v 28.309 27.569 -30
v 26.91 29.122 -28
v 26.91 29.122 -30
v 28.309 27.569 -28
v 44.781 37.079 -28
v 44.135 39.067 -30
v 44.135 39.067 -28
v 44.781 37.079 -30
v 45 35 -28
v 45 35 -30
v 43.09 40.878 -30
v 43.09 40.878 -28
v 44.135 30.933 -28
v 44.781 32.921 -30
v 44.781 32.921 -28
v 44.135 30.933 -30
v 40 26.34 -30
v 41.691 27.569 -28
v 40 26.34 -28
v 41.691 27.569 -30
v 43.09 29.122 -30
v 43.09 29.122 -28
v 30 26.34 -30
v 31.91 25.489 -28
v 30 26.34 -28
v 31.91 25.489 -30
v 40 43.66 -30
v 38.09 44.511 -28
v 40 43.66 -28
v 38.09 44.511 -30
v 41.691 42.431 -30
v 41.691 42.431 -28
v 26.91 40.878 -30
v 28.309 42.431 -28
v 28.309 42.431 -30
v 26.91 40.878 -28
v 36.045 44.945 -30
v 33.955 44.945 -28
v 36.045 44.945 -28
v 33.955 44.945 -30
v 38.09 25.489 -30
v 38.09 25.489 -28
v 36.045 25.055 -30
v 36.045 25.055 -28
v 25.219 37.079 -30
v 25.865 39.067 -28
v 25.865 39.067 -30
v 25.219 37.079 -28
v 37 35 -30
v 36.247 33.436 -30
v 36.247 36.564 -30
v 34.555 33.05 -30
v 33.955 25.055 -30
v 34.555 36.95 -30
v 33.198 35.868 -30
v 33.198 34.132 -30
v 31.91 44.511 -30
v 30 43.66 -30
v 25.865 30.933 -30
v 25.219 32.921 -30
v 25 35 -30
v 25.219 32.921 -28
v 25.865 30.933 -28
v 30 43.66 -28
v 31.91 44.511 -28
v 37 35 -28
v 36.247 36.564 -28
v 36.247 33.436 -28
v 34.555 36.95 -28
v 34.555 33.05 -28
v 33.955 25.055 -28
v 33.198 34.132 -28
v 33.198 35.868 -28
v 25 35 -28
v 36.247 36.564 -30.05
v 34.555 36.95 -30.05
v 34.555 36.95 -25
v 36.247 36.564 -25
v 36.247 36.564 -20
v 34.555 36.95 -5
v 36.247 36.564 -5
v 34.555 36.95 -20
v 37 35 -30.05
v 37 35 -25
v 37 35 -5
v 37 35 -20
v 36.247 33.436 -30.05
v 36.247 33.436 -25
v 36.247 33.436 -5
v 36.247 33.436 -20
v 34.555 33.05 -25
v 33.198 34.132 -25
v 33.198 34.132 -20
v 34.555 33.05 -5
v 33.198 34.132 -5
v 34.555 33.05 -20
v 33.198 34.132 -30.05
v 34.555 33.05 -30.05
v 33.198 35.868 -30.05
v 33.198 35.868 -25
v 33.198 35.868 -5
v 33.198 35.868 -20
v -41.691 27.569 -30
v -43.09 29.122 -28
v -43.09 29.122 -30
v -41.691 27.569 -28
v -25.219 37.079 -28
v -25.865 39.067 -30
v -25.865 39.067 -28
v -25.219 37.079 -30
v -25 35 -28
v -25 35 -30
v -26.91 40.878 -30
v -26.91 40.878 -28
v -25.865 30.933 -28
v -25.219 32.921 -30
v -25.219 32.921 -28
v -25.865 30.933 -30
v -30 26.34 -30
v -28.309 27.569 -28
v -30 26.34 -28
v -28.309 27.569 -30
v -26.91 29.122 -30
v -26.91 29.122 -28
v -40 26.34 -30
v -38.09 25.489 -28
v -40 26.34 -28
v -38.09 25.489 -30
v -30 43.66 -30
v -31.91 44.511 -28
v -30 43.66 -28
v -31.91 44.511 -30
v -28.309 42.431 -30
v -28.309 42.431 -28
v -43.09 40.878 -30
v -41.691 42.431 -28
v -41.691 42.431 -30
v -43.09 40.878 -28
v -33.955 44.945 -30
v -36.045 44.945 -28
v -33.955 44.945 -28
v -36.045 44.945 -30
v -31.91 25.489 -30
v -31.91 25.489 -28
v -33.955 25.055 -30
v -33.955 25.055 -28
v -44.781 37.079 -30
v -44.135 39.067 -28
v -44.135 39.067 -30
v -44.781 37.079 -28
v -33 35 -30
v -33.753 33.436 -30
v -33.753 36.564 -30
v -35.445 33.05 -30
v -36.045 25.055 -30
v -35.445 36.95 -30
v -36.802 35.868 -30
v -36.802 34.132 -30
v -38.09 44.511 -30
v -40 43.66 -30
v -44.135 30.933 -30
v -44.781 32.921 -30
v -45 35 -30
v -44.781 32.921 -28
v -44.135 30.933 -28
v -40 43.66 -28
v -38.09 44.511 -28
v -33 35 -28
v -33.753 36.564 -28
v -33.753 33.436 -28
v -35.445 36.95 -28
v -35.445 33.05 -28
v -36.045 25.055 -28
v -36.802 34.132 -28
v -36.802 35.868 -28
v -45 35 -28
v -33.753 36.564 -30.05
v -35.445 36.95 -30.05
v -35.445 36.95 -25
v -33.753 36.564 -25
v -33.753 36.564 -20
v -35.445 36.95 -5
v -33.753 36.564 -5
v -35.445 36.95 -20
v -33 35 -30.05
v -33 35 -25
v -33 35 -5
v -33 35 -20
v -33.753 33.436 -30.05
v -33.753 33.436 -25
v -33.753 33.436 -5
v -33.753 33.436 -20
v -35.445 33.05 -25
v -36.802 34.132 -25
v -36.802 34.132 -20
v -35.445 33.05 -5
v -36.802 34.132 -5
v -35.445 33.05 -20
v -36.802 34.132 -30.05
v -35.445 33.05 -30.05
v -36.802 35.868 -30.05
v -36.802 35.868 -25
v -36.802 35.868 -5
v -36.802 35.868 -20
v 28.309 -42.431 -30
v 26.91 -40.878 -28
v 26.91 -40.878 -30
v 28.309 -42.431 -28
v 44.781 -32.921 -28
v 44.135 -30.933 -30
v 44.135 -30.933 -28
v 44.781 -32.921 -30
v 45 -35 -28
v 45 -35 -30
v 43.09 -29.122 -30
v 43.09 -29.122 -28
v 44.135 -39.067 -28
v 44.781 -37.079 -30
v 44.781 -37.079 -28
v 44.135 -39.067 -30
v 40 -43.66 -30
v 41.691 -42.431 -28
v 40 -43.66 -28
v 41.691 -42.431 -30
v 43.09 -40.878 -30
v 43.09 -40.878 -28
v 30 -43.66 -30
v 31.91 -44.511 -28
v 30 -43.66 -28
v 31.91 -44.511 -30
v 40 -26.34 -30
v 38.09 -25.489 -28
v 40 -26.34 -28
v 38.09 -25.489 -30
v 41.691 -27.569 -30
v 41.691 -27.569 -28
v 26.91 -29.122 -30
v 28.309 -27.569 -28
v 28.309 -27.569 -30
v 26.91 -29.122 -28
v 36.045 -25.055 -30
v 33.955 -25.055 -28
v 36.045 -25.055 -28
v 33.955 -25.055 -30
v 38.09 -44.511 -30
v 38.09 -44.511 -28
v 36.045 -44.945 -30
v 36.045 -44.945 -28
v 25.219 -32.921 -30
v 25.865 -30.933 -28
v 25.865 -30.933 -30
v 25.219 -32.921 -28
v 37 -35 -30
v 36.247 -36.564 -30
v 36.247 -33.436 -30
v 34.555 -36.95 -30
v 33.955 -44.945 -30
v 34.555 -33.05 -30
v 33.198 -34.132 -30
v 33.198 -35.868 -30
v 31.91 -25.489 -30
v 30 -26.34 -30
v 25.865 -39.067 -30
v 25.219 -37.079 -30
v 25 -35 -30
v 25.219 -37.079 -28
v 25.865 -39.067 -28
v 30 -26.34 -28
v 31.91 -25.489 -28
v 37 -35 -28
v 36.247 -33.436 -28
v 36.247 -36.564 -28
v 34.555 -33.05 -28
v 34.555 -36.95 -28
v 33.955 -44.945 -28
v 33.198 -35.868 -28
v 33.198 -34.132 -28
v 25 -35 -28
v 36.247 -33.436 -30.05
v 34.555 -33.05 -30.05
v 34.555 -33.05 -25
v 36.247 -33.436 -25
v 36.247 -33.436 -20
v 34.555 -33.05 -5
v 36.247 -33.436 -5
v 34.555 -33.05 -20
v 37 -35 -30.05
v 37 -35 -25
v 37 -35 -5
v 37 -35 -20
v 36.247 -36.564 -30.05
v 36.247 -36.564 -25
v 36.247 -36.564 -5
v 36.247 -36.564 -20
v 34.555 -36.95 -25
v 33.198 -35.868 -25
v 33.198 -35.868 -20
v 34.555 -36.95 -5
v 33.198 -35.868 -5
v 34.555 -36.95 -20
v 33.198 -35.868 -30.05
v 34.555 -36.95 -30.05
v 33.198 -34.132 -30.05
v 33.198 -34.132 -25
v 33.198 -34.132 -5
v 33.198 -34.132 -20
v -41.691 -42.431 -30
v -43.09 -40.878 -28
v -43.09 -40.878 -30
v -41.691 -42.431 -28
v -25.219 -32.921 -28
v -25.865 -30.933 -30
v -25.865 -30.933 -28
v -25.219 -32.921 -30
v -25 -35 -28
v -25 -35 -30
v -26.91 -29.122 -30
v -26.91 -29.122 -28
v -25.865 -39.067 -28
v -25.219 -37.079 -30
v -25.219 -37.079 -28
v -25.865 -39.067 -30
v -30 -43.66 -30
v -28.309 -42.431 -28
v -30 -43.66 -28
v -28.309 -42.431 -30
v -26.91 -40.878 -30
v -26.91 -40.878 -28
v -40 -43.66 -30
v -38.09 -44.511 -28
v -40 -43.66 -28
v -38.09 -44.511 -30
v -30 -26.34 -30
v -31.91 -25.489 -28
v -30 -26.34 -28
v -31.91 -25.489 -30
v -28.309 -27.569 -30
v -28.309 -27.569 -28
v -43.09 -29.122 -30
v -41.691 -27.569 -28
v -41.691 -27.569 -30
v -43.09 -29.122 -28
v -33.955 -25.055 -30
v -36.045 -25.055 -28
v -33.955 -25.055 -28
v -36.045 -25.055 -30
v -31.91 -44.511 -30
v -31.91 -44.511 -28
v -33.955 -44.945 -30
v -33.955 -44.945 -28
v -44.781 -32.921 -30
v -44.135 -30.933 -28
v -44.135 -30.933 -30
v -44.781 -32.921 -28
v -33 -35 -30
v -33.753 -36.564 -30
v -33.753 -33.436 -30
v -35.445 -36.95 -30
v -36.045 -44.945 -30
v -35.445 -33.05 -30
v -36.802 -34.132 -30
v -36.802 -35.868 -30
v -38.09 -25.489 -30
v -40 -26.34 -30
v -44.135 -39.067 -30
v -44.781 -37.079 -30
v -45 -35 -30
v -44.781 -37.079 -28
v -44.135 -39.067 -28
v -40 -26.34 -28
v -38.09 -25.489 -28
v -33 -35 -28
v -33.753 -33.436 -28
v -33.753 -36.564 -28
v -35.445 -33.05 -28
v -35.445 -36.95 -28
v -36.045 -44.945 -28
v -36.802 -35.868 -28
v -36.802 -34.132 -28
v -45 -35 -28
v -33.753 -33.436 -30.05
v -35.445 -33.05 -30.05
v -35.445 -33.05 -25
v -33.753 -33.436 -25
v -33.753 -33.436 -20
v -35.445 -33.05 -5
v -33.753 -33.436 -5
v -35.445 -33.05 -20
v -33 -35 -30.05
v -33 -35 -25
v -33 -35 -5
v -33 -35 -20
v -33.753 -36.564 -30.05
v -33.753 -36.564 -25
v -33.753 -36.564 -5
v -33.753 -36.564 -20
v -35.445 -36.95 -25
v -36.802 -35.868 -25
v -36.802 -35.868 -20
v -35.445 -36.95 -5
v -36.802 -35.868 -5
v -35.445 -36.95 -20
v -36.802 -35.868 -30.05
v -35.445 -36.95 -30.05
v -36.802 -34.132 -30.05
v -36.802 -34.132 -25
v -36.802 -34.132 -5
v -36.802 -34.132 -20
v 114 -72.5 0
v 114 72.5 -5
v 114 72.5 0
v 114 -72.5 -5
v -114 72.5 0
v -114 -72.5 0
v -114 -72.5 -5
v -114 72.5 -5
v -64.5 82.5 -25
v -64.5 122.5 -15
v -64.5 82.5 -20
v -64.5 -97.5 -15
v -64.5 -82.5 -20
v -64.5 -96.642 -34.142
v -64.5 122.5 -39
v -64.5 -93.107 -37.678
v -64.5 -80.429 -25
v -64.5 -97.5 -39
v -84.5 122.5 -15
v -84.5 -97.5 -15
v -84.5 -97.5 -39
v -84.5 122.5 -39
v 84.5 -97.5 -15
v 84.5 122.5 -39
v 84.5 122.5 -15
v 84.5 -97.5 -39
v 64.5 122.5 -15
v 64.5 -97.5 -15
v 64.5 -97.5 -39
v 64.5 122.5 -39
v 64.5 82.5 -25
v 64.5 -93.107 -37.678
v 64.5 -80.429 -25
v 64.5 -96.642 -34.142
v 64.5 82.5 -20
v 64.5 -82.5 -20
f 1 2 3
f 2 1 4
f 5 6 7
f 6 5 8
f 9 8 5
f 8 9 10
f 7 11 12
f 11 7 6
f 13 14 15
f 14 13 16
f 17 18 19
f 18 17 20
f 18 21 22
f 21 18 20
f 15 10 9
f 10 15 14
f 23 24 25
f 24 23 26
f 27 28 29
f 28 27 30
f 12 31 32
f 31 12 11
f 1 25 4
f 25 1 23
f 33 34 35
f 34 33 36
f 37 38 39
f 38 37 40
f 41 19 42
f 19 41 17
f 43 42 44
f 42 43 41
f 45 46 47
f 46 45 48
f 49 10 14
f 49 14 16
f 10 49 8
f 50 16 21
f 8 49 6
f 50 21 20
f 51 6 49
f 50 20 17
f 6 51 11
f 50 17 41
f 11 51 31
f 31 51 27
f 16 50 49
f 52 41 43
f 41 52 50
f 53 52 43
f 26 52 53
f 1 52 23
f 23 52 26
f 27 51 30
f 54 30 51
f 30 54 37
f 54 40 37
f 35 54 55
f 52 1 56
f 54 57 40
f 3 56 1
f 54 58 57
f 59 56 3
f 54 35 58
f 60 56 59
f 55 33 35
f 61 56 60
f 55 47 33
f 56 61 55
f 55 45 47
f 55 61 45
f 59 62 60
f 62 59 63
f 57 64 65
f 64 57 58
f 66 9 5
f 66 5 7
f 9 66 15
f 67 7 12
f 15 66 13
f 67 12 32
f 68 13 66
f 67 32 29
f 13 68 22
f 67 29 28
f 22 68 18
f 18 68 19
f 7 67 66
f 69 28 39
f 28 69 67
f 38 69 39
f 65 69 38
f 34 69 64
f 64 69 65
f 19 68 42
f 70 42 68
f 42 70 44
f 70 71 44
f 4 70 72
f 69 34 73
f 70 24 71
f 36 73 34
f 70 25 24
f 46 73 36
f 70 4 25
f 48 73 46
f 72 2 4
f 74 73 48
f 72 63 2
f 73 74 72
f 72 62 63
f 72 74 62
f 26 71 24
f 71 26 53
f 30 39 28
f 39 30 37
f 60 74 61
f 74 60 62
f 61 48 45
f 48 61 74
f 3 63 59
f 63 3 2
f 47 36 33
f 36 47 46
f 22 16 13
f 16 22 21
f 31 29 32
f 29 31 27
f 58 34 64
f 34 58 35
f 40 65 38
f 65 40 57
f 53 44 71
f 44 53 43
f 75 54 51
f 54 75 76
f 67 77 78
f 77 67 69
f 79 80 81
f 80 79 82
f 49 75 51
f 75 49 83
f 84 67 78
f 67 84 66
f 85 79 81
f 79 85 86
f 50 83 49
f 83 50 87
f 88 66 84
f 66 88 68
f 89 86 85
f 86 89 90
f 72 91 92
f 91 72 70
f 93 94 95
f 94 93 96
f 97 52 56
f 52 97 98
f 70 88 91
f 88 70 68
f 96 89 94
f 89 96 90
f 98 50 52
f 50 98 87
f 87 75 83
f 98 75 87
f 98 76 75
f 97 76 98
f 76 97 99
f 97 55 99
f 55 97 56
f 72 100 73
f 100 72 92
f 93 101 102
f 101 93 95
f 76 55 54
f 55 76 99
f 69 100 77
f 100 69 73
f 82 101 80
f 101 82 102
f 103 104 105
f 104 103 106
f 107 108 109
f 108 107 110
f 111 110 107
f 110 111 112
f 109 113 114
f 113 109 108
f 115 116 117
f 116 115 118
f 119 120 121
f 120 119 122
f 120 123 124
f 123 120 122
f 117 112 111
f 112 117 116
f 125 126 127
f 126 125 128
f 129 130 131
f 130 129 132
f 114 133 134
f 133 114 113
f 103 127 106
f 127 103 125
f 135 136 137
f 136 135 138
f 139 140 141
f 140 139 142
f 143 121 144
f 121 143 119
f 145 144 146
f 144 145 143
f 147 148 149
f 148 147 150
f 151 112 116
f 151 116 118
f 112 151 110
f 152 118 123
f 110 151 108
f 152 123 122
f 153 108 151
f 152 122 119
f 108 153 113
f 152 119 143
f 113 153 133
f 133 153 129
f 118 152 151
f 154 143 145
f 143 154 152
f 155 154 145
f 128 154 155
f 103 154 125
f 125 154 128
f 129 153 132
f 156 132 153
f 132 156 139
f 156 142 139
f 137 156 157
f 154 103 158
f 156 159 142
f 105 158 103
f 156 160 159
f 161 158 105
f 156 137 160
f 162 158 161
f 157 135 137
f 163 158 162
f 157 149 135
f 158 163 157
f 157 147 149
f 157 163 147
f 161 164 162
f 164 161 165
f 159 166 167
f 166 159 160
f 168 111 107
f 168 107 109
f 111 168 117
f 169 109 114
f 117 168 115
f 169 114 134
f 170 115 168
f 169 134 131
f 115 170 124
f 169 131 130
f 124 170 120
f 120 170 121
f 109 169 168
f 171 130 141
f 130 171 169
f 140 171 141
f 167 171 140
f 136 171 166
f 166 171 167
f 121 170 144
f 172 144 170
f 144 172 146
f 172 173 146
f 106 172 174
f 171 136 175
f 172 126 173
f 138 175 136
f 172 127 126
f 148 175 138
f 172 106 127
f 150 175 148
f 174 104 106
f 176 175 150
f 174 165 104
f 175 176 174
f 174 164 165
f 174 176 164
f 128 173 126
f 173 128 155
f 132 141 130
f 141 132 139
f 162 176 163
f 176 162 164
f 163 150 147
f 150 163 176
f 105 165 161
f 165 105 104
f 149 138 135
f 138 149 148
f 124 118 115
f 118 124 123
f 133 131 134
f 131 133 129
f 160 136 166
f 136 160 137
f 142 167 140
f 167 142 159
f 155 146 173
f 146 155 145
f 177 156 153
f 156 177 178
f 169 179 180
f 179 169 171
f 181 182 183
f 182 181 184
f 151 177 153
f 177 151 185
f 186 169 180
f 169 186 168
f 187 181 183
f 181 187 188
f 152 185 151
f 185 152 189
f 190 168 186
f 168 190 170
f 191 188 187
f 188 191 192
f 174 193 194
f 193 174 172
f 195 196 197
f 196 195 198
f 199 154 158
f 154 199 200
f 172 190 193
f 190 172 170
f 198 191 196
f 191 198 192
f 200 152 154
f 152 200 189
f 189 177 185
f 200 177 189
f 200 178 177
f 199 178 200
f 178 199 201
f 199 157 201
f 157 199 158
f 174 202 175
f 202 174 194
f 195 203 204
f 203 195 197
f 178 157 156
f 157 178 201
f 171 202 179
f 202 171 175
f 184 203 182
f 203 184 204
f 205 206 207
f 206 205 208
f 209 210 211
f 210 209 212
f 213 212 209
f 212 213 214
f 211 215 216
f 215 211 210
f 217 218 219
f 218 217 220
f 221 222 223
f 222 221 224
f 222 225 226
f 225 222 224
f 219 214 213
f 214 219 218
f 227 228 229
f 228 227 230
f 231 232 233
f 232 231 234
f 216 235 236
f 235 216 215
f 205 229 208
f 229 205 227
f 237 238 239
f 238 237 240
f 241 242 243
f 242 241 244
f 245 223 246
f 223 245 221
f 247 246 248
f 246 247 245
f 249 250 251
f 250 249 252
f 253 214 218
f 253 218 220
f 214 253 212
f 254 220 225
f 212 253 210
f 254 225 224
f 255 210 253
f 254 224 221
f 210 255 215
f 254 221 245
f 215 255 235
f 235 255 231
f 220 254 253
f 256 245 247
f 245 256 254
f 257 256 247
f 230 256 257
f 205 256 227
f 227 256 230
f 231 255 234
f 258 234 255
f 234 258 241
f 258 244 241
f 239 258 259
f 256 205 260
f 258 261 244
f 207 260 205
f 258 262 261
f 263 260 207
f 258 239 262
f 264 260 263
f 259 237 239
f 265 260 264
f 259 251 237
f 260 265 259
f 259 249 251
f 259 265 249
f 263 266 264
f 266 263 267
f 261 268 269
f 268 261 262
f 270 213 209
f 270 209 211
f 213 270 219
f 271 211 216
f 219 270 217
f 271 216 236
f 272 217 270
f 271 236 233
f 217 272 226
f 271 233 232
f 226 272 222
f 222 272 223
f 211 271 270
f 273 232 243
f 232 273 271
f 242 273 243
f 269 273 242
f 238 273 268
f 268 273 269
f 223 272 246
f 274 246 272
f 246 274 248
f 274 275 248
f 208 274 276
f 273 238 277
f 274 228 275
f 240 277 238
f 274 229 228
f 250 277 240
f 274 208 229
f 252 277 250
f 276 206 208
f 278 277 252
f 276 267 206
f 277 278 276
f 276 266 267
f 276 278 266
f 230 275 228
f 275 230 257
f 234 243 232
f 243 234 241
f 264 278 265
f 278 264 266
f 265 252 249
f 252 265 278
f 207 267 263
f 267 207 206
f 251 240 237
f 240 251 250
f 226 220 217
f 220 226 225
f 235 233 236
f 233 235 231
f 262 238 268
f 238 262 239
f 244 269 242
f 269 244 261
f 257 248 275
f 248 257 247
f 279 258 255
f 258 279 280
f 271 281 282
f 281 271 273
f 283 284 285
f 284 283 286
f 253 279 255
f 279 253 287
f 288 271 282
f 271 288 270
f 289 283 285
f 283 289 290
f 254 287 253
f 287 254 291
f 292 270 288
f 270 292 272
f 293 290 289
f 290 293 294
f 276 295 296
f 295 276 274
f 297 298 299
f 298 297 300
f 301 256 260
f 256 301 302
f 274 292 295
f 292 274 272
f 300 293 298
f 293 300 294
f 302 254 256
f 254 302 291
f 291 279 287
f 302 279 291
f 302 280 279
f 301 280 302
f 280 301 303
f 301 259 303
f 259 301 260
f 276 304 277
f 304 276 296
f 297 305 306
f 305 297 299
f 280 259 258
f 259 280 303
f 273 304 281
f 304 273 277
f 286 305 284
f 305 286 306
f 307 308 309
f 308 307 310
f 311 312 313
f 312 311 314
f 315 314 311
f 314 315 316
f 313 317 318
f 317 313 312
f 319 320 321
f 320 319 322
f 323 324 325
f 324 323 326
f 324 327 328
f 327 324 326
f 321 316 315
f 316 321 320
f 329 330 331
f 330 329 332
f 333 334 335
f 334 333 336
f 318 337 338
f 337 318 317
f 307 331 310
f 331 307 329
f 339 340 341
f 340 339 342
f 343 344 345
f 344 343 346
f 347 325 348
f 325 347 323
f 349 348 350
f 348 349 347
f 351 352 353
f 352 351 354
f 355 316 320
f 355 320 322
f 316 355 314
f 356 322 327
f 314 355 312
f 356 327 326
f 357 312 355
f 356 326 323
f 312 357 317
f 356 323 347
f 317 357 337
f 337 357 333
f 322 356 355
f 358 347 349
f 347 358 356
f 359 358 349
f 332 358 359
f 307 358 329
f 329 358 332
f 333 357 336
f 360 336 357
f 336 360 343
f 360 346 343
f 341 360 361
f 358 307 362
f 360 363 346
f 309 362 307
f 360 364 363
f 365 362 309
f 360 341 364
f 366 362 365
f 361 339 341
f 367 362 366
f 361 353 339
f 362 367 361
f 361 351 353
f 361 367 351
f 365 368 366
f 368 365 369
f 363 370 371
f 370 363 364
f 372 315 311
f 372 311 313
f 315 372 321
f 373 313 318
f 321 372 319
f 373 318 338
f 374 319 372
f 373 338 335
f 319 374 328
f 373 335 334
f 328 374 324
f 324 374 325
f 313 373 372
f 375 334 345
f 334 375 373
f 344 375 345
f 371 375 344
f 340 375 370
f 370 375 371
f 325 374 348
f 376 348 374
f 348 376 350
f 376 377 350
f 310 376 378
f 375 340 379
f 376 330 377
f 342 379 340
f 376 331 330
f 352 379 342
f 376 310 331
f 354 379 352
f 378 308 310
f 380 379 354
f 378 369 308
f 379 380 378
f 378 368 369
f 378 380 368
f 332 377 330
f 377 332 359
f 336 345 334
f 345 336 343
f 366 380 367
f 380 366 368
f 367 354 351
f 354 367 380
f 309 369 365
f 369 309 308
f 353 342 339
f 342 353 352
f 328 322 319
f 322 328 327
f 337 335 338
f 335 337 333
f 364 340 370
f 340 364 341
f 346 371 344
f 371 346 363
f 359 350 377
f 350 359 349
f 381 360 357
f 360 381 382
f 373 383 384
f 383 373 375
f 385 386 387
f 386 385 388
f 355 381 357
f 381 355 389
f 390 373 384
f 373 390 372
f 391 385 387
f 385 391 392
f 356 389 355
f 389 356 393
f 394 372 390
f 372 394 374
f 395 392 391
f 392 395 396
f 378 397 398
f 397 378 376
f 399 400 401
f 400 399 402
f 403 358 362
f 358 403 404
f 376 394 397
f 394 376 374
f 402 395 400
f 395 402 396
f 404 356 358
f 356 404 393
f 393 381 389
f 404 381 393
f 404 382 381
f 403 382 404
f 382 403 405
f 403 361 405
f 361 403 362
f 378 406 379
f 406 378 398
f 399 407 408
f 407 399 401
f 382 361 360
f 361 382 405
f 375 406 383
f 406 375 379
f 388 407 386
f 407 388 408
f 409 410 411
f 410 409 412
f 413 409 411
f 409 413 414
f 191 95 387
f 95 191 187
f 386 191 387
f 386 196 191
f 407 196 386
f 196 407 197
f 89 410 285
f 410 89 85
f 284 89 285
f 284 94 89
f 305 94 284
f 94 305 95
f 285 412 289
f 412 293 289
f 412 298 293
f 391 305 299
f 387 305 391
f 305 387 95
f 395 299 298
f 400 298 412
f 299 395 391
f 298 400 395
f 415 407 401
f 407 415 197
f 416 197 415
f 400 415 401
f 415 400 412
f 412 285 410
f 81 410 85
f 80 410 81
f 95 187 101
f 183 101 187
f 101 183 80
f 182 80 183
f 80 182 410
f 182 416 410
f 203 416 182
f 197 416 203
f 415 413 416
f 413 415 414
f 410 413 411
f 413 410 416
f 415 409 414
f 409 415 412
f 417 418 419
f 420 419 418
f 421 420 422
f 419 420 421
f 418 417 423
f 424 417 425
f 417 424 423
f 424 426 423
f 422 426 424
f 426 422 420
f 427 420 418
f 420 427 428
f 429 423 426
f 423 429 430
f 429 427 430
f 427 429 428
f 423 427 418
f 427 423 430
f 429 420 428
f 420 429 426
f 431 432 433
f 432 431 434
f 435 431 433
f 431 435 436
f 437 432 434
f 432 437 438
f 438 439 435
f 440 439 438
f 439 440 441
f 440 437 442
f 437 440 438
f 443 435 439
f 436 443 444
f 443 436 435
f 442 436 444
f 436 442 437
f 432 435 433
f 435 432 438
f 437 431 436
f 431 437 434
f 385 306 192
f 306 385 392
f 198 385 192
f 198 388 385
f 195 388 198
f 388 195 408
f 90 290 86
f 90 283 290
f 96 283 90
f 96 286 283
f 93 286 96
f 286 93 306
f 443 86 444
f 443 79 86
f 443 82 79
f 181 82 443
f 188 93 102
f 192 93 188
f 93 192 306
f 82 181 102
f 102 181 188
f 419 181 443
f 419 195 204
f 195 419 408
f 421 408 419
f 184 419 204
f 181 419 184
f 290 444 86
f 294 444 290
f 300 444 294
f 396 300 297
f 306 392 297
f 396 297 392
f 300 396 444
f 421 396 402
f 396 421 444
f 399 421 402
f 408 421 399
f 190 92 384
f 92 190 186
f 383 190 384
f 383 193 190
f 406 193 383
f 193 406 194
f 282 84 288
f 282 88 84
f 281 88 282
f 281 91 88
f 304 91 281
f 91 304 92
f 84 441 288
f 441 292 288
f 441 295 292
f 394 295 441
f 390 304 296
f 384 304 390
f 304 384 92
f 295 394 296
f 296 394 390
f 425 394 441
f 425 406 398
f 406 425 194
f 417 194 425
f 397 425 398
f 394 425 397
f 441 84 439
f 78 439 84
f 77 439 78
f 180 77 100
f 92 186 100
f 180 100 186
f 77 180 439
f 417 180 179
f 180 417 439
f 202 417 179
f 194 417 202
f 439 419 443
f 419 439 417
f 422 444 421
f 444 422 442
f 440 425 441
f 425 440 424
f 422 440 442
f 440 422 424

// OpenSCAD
// file: ../Settings.scad
// Mesurements Of Platform Actual & Global Settings
// Mesurements ACTUAL
PlateWidth = 228;
PlateDepth = 145;
PlateHeight = 5;

ArmWidth = 20;
ArmHeight = 24;
ArmForwardProjection = 25;
ArmRearProjection = 50;
ArmVOffset = 15;

BaseWidth = 129;
BaseHeight = 5;
BaseForwardProjection = 10;
BaseRearProjection = 10;
BaseVOffset = 20;

BaseDeflectorLength = 20;
BaseDeflectorAngle = 45;

ScrewsWidthOutset = 35;
ScrewsDepthOutset = 35;
ScrewsHeadRadius = 10;
ScrewsHeadHeight = 2;
ScrewsHeadProtrusion = 5;
ScrewsShaftRadius = 2;
ScrewsHeadCutoutRadius = 2;

RearPlugWidth = 10;
RearPlugHeight = 5;
RearPlugVOffset = 1;

// Options
// ****************************************************************************************************

d = 0.05;   //Delta

ClipSticksize = 8;
PlateThickness = 5;

TensionerBearingRadius = 2;
TensionerOffsetRadius = 15;
TensionerAngle = 45;
TensionerBearingExtention = 3;
TensionerInset = 2;

//lips to keep the belt in
Lip = 3;
//TopLip = 500;
BottomLip = 5;

MidPlateOverlap = 20;
MidPlateOverlapHeight = 10;
MidPlateOverlapOffset = 7;
ClipHoleSize = 5;

LowerPlateCrossover =10;

RollerCore = 2;
RollerClearance = 2;
RollerLength = PlateDepth - 2*RollerClearance;

UpperRollerProjection  = 40;
UpperRollerRadius = 8;

LowerRollerProjection = 20;
LowerRollerRadius = 6;

RollerBearingCutoutRadius = 3;

IbeamProjection = 15;
IbeamPlateThikness = 6;


// Calculated
// ************************************************************************************************************
PlateX = BaseWidth/2;

RollerLength = PlateDepth - 2*RollerClearance;
PlateArmOverhang = PlateWidth/2 - BaseWidth/2  - ArmWidth; 

UpperRollerPlateX = ArmWidth+PlateArmOverhang+UpperRollerProjection-UpperRollerRadius;
UpperRollerPlateY = -UpperRollerRadius; 

LowerRollerPlateX = ArmWidth+PlateArmOverhang+LowerRollerProjection-LowerRollerRadius;
LowerRollerPlateY = -(ArmVOffset+ArmHeight)+LowerRollerRadius;
// main file
// Roller Project Part #1 Front Bracket
include <../Settings.scad>;

rig();




module rig(){
//plate
translate( v= [-PlateWidth/2,-PlateDepth/2,-PlateHeight]){
	color("Silver") cube(size=[PlateWidth,PlateDepth,PlateHeight]);
}

//arm
translate( v= [-BaseWidth/2-ArmWidth,-PlateDepth/2-ArmForwardProjection,-ArmVOffset-ArmHeight]){
	color("DimGray") cube(size=[ArmWidth,PlateDepth+ArmForwardProjection+ArmRearProjection,ArmHeight]);
}

//arm
translate( v= [BaseWidth/2,-PlateDepth/2-ArmForwardProjection,-ArmVOffset-ArmHeight]){
	color("DimGray")  cube(size=[ArmWidth,PlateDepth+ArmForwardProjection+ArmRearProjection,ArmHeight]);
}

//base
translate( v= [-BaseWidth/2,-PlateDepth/2-BaseForwardProjection,-BaseVOffset-BaseHeight]){
	color("Gainsboro") cube (size=[BaseWidth,PlateDepth+BaseForwardProjection+BaseRearProjection,BaseHeight]);
}

color("Gainsboro")RigLogoPlate();

translate(v= [ScrewsWidthOutset,ScrewsDepthOutset,-(BaseVOffset+BaseHeight+ScrewsHeadProtrusion)])
color("SlateGray") RigScrew();

translate(v= [-ScrewsWidthOutset,ScrewsDepthOutset,-(BaseVOffset+BaseHeight+ScrewsHeadProtrusion)])
color("SlateGray") RigScrew();

translate(v= [ScrewsWidthOutset,-ScrewsDepthOutset,-(BaseVOffset+BaseHeight+ScrewsHeadProtrusion)])
color("SlateGray") RigScrew();

translate(v= [-ScrewsWidthOutset,-ScrewsDepthOutset,-(BaseVOffset+BaseHeight+ScrewsHeadProtrusion)])
color("SlateGray") RigScrew();


}



module RigScrew(){
	cylinder(h=ScrewsHeadHeight, r=ScrewsHeadRadius );
	cylinder(h=ScrewsHeadHeight, r=ScrewsHeadRadius );
	translate(v = [0,0,-d]){
		cylinder(h=BaseVOffset+BaseHeight+ScrewsHeadProtrusion-d, r=ScrewsShaftRadius );
	}
}



module RigLogoPlate(){
translate( v= [0,-PlateDepth/2-BaseForwardProjection,-BaseVOffset])
rotate(v= [1,0,0], a=BaseDeflectorAngle )
	translate(v=[-BaseWidth/2,-BaseDeflectorLength,-BaseHeight])
		cube(size=[BaseWidth,BaseDeflectorLength,BaseHeight]);


}
